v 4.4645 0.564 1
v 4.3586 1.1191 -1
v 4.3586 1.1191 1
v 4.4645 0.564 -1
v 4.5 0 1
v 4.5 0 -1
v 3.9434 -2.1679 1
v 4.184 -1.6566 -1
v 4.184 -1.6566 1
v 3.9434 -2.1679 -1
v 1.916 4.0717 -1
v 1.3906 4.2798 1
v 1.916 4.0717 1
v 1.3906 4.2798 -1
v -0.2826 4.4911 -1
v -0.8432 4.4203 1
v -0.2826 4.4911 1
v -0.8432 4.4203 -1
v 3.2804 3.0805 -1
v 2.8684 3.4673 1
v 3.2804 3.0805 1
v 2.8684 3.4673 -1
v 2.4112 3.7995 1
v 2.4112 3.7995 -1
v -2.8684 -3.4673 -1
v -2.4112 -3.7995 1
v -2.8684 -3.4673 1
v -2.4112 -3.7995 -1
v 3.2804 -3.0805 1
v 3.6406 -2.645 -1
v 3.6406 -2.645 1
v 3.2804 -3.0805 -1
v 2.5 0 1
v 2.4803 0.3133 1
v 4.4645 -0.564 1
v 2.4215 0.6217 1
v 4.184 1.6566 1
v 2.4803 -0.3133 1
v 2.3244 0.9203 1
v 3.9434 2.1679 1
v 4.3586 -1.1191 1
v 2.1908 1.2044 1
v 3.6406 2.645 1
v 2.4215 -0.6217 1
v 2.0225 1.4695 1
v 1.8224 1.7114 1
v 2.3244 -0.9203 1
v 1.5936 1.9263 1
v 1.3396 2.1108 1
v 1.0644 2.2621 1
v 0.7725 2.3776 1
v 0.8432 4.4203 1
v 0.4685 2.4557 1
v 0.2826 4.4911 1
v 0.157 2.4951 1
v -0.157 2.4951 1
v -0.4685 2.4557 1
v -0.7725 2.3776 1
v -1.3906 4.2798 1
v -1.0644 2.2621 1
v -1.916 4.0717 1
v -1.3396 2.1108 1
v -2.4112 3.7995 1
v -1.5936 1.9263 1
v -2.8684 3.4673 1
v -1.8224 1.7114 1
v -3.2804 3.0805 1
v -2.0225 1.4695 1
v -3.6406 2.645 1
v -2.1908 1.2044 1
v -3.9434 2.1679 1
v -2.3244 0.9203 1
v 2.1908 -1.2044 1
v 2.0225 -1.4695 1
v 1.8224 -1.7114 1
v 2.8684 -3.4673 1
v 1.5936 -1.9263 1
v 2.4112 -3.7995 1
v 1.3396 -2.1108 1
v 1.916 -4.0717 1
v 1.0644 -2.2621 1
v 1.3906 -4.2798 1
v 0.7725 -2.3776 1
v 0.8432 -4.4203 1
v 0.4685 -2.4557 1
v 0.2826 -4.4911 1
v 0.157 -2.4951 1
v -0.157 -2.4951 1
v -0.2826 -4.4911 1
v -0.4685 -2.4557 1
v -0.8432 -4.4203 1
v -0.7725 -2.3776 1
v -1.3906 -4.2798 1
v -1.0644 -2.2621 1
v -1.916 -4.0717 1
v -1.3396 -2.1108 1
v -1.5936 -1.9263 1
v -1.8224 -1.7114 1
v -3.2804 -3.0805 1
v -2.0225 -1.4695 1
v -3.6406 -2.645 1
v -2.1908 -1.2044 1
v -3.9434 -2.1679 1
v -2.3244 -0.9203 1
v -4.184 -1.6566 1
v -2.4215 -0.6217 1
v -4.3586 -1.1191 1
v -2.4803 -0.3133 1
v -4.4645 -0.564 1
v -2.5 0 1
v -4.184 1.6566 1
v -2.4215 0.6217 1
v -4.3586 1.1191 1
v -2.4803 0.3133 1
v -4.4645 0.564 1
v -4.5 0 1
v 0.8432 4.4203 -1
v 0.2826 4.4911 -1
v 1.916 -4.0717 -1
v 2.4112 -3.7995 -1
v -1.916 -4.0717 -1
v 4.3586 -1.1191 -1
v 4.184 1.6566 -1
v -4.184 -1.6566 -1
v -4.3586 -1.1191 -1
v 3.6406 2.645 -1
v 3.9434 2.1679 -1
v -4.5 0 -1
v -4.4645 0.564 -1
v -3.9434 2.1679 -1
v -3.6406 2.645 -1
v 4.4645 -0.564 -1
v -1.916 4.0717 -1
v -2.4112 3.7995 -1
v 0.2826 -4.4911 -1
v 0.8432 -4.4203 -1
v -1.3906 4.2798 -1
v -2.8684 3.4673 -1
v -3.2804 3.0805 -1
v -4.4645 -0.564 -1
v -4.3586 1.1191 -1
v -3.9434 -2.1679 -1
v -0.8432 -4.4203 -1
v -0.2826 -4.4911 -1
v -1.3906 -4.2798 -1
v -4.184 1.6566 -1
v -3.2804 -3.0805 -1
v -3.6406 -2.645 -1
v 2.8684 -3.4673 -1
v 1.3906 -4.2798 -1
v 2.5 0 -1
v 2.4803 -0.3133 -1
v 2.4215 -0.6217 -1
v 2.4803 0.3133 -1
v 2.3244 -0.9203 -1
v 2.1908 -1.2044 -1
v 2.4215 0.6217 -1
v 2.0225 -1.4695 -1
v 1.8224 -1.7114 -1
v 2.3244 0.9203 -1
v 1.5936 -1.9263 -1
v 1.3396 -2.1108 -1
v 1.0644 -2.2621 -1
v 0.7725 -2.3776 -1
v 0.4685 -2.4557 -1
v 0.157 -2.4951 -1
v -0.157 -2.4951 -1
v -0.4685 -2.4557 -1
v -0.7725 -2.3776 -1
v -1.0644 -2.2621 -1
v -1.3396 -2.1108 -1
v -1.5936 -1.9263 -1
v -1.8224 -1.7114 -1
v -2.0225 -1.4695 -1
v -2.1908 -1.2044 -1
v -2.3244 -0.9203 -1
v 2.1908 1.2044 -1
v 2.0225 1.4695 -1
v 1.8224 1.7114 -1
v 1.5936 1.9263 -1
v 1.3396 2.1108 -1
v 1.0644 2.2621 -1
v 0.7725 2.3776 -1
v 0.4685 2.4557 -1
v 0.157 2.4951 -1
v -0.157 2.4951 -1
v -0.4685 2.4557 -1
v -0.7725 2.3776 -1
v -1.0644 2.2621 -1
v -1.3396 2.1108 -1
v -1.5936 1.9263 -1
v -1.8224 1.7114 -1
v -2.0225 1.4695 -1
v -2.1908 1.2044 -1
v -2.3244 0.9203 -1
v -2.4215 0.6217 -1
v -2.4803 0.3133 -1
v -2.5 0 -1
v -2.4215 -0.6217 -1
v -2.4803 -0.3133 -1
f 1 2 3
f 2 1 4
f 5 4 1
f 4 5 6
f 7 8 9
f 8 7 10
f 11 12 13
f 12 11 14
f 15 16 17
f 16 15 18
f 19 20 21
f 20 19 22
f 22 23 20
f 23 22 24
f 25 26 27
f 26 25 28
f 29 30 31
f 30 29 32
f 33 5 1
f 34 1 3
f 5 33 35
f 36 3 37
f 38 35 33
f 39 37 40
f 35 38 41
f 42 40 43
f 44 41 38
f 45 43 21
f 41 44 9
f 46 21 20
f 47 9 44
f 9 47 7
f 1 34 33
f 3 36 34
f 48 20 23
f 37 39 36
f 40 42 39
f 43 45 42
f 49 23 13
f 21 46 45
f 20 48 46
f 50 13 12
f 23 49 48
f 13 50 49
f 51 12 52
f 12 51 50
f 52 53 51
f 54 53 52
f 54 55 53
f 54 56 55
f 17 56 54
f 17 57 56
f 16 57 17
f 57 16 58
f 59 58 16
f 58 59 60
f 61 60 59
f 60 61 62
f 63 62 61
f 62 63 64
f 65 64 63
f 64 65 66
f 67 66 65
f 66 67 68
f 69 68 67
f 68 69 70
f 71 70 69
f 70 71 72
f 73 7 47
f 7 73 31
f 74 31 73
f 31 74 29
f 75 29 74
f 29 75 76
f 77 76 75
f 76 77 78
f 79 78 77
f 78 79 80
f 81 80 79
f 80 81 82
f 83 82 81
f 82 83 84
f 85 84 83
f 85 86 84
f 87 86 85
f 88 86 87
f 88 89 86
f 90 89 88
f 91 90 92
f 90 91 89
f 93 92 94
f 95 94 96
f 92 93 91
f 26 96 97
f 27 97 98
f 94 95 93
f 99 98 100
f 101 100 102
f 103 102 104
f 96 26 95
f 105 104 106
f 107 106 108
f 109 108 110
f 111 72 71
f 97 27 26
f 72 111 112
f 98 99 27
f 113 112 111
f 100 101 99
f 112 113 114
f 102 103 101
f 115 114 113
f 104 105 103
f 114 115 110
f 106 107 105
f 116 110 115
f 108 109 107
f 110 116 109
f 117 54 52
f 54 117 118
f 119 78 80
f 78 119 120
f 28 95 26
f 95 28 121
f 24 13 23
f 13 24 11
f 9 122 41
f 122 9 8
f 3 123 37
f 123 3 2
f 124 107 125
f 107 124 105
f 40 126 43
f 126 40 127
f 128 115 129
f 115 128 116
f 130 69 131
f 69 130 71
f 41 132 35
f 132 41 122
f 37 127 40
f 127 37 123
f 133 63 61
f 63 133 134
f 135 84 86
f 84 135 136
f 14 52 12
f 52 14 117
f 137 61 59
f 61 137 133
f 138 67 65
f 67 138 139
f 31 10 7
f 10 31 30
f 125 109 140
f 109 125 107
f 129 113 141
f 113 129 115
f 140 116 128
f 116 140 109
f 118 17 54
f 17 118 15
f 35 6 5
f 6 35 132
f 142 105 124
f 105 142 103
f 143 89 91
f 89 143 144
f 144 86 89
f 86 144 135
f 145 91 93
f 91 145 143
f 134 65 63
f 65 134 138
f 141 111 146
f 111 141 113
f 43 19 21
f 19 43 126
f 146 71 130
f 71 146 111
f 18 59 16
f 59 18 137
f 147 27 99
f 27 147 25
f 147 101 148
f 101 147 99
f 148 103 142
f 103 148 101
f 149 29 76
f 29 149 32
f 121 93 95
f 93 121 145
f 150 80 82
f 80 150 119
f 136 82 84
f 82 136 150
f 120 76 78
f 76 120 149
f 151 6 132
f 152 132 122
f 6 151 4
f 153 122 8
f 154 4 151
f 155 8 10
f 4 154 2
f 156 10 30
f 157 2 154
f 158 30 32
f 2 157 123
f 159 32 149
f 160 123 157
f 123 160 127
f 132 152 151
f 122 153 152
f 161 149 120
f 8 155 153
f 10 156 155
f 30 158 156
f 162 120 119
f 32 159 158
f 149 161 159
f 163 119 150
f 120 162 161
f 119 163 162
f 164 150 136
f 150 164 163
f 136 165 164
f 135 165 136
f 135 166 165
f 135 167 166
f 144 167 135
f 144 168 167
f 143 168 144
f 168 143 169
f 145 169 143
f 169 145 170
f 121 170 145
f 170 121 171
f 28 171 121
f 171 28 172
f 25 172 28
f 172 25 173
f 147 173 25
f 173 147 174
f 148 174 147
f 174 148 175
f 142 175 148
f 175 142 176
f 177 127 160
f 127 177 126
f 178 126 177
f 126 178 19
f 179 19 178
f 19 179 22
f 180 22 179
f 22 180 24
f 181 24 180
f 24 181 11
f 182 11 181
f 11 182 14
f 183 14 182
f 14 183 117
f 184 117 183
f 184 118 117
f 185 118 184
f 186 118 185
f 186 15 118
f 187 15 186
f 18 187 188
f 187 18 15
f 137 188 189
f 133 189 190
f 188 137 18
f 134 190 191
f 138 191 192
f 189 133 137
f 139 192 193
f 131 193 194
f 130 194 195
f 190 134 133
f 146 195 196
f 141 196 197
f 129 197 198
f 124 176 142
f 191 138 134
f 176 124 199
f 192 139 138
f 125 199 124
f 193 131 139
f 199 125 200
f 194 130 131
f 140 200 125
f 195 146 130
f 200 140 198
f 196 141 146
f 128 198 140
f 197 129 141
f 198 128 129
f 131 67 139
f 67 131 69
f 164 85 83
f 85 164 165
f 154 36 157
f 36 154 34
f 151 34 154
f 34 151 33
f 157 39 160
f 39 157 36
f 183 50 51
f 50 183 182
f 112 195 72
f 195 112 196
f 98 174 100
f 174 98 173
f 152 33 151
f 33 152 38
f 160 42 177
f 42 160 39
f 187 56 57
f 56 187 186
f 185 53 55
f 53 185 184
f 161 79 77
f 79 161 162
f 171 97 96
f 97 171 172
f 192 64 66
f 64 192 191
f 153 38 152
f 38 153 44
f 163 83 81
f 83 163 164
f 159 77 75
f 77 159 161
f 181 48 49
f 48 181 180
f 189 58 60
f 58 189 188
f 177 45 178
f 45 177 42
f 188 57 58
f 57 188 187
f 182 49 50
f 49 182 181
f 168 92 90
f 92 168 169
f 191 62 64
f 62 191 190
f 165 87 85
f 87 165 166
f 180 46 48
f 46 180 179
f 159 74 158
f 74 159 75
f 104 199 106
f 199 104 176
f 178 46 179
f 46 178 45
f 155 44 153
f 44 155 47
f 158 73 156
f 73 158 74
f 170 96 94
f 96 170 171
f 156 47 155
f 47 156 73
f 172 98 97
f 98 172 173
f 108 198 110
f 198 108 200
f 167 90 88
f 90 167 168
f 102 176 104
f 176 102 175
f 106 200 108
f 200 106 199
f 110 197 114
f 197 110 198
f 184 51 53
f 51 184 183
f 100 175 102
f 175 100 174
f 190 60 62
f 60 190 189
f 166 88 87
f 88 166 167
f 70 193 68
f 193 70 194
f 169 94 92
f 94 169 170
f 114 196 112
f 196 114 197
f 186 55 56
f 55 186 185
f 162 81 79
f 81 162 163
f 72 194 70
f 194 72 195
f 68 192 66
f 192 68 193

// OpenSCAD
$fn = 50;


difference() {
	union() {
		translate(v = [0, 0, -1.0000000000]) {
			cylinder(h = 2, r = 4.5000000000);
		}
	}
	union() {
		translate(v = [0, 0, -100.0000000000]) {
			cylinder(h = 200, r = 2.5000000000);
		}
	}
}
